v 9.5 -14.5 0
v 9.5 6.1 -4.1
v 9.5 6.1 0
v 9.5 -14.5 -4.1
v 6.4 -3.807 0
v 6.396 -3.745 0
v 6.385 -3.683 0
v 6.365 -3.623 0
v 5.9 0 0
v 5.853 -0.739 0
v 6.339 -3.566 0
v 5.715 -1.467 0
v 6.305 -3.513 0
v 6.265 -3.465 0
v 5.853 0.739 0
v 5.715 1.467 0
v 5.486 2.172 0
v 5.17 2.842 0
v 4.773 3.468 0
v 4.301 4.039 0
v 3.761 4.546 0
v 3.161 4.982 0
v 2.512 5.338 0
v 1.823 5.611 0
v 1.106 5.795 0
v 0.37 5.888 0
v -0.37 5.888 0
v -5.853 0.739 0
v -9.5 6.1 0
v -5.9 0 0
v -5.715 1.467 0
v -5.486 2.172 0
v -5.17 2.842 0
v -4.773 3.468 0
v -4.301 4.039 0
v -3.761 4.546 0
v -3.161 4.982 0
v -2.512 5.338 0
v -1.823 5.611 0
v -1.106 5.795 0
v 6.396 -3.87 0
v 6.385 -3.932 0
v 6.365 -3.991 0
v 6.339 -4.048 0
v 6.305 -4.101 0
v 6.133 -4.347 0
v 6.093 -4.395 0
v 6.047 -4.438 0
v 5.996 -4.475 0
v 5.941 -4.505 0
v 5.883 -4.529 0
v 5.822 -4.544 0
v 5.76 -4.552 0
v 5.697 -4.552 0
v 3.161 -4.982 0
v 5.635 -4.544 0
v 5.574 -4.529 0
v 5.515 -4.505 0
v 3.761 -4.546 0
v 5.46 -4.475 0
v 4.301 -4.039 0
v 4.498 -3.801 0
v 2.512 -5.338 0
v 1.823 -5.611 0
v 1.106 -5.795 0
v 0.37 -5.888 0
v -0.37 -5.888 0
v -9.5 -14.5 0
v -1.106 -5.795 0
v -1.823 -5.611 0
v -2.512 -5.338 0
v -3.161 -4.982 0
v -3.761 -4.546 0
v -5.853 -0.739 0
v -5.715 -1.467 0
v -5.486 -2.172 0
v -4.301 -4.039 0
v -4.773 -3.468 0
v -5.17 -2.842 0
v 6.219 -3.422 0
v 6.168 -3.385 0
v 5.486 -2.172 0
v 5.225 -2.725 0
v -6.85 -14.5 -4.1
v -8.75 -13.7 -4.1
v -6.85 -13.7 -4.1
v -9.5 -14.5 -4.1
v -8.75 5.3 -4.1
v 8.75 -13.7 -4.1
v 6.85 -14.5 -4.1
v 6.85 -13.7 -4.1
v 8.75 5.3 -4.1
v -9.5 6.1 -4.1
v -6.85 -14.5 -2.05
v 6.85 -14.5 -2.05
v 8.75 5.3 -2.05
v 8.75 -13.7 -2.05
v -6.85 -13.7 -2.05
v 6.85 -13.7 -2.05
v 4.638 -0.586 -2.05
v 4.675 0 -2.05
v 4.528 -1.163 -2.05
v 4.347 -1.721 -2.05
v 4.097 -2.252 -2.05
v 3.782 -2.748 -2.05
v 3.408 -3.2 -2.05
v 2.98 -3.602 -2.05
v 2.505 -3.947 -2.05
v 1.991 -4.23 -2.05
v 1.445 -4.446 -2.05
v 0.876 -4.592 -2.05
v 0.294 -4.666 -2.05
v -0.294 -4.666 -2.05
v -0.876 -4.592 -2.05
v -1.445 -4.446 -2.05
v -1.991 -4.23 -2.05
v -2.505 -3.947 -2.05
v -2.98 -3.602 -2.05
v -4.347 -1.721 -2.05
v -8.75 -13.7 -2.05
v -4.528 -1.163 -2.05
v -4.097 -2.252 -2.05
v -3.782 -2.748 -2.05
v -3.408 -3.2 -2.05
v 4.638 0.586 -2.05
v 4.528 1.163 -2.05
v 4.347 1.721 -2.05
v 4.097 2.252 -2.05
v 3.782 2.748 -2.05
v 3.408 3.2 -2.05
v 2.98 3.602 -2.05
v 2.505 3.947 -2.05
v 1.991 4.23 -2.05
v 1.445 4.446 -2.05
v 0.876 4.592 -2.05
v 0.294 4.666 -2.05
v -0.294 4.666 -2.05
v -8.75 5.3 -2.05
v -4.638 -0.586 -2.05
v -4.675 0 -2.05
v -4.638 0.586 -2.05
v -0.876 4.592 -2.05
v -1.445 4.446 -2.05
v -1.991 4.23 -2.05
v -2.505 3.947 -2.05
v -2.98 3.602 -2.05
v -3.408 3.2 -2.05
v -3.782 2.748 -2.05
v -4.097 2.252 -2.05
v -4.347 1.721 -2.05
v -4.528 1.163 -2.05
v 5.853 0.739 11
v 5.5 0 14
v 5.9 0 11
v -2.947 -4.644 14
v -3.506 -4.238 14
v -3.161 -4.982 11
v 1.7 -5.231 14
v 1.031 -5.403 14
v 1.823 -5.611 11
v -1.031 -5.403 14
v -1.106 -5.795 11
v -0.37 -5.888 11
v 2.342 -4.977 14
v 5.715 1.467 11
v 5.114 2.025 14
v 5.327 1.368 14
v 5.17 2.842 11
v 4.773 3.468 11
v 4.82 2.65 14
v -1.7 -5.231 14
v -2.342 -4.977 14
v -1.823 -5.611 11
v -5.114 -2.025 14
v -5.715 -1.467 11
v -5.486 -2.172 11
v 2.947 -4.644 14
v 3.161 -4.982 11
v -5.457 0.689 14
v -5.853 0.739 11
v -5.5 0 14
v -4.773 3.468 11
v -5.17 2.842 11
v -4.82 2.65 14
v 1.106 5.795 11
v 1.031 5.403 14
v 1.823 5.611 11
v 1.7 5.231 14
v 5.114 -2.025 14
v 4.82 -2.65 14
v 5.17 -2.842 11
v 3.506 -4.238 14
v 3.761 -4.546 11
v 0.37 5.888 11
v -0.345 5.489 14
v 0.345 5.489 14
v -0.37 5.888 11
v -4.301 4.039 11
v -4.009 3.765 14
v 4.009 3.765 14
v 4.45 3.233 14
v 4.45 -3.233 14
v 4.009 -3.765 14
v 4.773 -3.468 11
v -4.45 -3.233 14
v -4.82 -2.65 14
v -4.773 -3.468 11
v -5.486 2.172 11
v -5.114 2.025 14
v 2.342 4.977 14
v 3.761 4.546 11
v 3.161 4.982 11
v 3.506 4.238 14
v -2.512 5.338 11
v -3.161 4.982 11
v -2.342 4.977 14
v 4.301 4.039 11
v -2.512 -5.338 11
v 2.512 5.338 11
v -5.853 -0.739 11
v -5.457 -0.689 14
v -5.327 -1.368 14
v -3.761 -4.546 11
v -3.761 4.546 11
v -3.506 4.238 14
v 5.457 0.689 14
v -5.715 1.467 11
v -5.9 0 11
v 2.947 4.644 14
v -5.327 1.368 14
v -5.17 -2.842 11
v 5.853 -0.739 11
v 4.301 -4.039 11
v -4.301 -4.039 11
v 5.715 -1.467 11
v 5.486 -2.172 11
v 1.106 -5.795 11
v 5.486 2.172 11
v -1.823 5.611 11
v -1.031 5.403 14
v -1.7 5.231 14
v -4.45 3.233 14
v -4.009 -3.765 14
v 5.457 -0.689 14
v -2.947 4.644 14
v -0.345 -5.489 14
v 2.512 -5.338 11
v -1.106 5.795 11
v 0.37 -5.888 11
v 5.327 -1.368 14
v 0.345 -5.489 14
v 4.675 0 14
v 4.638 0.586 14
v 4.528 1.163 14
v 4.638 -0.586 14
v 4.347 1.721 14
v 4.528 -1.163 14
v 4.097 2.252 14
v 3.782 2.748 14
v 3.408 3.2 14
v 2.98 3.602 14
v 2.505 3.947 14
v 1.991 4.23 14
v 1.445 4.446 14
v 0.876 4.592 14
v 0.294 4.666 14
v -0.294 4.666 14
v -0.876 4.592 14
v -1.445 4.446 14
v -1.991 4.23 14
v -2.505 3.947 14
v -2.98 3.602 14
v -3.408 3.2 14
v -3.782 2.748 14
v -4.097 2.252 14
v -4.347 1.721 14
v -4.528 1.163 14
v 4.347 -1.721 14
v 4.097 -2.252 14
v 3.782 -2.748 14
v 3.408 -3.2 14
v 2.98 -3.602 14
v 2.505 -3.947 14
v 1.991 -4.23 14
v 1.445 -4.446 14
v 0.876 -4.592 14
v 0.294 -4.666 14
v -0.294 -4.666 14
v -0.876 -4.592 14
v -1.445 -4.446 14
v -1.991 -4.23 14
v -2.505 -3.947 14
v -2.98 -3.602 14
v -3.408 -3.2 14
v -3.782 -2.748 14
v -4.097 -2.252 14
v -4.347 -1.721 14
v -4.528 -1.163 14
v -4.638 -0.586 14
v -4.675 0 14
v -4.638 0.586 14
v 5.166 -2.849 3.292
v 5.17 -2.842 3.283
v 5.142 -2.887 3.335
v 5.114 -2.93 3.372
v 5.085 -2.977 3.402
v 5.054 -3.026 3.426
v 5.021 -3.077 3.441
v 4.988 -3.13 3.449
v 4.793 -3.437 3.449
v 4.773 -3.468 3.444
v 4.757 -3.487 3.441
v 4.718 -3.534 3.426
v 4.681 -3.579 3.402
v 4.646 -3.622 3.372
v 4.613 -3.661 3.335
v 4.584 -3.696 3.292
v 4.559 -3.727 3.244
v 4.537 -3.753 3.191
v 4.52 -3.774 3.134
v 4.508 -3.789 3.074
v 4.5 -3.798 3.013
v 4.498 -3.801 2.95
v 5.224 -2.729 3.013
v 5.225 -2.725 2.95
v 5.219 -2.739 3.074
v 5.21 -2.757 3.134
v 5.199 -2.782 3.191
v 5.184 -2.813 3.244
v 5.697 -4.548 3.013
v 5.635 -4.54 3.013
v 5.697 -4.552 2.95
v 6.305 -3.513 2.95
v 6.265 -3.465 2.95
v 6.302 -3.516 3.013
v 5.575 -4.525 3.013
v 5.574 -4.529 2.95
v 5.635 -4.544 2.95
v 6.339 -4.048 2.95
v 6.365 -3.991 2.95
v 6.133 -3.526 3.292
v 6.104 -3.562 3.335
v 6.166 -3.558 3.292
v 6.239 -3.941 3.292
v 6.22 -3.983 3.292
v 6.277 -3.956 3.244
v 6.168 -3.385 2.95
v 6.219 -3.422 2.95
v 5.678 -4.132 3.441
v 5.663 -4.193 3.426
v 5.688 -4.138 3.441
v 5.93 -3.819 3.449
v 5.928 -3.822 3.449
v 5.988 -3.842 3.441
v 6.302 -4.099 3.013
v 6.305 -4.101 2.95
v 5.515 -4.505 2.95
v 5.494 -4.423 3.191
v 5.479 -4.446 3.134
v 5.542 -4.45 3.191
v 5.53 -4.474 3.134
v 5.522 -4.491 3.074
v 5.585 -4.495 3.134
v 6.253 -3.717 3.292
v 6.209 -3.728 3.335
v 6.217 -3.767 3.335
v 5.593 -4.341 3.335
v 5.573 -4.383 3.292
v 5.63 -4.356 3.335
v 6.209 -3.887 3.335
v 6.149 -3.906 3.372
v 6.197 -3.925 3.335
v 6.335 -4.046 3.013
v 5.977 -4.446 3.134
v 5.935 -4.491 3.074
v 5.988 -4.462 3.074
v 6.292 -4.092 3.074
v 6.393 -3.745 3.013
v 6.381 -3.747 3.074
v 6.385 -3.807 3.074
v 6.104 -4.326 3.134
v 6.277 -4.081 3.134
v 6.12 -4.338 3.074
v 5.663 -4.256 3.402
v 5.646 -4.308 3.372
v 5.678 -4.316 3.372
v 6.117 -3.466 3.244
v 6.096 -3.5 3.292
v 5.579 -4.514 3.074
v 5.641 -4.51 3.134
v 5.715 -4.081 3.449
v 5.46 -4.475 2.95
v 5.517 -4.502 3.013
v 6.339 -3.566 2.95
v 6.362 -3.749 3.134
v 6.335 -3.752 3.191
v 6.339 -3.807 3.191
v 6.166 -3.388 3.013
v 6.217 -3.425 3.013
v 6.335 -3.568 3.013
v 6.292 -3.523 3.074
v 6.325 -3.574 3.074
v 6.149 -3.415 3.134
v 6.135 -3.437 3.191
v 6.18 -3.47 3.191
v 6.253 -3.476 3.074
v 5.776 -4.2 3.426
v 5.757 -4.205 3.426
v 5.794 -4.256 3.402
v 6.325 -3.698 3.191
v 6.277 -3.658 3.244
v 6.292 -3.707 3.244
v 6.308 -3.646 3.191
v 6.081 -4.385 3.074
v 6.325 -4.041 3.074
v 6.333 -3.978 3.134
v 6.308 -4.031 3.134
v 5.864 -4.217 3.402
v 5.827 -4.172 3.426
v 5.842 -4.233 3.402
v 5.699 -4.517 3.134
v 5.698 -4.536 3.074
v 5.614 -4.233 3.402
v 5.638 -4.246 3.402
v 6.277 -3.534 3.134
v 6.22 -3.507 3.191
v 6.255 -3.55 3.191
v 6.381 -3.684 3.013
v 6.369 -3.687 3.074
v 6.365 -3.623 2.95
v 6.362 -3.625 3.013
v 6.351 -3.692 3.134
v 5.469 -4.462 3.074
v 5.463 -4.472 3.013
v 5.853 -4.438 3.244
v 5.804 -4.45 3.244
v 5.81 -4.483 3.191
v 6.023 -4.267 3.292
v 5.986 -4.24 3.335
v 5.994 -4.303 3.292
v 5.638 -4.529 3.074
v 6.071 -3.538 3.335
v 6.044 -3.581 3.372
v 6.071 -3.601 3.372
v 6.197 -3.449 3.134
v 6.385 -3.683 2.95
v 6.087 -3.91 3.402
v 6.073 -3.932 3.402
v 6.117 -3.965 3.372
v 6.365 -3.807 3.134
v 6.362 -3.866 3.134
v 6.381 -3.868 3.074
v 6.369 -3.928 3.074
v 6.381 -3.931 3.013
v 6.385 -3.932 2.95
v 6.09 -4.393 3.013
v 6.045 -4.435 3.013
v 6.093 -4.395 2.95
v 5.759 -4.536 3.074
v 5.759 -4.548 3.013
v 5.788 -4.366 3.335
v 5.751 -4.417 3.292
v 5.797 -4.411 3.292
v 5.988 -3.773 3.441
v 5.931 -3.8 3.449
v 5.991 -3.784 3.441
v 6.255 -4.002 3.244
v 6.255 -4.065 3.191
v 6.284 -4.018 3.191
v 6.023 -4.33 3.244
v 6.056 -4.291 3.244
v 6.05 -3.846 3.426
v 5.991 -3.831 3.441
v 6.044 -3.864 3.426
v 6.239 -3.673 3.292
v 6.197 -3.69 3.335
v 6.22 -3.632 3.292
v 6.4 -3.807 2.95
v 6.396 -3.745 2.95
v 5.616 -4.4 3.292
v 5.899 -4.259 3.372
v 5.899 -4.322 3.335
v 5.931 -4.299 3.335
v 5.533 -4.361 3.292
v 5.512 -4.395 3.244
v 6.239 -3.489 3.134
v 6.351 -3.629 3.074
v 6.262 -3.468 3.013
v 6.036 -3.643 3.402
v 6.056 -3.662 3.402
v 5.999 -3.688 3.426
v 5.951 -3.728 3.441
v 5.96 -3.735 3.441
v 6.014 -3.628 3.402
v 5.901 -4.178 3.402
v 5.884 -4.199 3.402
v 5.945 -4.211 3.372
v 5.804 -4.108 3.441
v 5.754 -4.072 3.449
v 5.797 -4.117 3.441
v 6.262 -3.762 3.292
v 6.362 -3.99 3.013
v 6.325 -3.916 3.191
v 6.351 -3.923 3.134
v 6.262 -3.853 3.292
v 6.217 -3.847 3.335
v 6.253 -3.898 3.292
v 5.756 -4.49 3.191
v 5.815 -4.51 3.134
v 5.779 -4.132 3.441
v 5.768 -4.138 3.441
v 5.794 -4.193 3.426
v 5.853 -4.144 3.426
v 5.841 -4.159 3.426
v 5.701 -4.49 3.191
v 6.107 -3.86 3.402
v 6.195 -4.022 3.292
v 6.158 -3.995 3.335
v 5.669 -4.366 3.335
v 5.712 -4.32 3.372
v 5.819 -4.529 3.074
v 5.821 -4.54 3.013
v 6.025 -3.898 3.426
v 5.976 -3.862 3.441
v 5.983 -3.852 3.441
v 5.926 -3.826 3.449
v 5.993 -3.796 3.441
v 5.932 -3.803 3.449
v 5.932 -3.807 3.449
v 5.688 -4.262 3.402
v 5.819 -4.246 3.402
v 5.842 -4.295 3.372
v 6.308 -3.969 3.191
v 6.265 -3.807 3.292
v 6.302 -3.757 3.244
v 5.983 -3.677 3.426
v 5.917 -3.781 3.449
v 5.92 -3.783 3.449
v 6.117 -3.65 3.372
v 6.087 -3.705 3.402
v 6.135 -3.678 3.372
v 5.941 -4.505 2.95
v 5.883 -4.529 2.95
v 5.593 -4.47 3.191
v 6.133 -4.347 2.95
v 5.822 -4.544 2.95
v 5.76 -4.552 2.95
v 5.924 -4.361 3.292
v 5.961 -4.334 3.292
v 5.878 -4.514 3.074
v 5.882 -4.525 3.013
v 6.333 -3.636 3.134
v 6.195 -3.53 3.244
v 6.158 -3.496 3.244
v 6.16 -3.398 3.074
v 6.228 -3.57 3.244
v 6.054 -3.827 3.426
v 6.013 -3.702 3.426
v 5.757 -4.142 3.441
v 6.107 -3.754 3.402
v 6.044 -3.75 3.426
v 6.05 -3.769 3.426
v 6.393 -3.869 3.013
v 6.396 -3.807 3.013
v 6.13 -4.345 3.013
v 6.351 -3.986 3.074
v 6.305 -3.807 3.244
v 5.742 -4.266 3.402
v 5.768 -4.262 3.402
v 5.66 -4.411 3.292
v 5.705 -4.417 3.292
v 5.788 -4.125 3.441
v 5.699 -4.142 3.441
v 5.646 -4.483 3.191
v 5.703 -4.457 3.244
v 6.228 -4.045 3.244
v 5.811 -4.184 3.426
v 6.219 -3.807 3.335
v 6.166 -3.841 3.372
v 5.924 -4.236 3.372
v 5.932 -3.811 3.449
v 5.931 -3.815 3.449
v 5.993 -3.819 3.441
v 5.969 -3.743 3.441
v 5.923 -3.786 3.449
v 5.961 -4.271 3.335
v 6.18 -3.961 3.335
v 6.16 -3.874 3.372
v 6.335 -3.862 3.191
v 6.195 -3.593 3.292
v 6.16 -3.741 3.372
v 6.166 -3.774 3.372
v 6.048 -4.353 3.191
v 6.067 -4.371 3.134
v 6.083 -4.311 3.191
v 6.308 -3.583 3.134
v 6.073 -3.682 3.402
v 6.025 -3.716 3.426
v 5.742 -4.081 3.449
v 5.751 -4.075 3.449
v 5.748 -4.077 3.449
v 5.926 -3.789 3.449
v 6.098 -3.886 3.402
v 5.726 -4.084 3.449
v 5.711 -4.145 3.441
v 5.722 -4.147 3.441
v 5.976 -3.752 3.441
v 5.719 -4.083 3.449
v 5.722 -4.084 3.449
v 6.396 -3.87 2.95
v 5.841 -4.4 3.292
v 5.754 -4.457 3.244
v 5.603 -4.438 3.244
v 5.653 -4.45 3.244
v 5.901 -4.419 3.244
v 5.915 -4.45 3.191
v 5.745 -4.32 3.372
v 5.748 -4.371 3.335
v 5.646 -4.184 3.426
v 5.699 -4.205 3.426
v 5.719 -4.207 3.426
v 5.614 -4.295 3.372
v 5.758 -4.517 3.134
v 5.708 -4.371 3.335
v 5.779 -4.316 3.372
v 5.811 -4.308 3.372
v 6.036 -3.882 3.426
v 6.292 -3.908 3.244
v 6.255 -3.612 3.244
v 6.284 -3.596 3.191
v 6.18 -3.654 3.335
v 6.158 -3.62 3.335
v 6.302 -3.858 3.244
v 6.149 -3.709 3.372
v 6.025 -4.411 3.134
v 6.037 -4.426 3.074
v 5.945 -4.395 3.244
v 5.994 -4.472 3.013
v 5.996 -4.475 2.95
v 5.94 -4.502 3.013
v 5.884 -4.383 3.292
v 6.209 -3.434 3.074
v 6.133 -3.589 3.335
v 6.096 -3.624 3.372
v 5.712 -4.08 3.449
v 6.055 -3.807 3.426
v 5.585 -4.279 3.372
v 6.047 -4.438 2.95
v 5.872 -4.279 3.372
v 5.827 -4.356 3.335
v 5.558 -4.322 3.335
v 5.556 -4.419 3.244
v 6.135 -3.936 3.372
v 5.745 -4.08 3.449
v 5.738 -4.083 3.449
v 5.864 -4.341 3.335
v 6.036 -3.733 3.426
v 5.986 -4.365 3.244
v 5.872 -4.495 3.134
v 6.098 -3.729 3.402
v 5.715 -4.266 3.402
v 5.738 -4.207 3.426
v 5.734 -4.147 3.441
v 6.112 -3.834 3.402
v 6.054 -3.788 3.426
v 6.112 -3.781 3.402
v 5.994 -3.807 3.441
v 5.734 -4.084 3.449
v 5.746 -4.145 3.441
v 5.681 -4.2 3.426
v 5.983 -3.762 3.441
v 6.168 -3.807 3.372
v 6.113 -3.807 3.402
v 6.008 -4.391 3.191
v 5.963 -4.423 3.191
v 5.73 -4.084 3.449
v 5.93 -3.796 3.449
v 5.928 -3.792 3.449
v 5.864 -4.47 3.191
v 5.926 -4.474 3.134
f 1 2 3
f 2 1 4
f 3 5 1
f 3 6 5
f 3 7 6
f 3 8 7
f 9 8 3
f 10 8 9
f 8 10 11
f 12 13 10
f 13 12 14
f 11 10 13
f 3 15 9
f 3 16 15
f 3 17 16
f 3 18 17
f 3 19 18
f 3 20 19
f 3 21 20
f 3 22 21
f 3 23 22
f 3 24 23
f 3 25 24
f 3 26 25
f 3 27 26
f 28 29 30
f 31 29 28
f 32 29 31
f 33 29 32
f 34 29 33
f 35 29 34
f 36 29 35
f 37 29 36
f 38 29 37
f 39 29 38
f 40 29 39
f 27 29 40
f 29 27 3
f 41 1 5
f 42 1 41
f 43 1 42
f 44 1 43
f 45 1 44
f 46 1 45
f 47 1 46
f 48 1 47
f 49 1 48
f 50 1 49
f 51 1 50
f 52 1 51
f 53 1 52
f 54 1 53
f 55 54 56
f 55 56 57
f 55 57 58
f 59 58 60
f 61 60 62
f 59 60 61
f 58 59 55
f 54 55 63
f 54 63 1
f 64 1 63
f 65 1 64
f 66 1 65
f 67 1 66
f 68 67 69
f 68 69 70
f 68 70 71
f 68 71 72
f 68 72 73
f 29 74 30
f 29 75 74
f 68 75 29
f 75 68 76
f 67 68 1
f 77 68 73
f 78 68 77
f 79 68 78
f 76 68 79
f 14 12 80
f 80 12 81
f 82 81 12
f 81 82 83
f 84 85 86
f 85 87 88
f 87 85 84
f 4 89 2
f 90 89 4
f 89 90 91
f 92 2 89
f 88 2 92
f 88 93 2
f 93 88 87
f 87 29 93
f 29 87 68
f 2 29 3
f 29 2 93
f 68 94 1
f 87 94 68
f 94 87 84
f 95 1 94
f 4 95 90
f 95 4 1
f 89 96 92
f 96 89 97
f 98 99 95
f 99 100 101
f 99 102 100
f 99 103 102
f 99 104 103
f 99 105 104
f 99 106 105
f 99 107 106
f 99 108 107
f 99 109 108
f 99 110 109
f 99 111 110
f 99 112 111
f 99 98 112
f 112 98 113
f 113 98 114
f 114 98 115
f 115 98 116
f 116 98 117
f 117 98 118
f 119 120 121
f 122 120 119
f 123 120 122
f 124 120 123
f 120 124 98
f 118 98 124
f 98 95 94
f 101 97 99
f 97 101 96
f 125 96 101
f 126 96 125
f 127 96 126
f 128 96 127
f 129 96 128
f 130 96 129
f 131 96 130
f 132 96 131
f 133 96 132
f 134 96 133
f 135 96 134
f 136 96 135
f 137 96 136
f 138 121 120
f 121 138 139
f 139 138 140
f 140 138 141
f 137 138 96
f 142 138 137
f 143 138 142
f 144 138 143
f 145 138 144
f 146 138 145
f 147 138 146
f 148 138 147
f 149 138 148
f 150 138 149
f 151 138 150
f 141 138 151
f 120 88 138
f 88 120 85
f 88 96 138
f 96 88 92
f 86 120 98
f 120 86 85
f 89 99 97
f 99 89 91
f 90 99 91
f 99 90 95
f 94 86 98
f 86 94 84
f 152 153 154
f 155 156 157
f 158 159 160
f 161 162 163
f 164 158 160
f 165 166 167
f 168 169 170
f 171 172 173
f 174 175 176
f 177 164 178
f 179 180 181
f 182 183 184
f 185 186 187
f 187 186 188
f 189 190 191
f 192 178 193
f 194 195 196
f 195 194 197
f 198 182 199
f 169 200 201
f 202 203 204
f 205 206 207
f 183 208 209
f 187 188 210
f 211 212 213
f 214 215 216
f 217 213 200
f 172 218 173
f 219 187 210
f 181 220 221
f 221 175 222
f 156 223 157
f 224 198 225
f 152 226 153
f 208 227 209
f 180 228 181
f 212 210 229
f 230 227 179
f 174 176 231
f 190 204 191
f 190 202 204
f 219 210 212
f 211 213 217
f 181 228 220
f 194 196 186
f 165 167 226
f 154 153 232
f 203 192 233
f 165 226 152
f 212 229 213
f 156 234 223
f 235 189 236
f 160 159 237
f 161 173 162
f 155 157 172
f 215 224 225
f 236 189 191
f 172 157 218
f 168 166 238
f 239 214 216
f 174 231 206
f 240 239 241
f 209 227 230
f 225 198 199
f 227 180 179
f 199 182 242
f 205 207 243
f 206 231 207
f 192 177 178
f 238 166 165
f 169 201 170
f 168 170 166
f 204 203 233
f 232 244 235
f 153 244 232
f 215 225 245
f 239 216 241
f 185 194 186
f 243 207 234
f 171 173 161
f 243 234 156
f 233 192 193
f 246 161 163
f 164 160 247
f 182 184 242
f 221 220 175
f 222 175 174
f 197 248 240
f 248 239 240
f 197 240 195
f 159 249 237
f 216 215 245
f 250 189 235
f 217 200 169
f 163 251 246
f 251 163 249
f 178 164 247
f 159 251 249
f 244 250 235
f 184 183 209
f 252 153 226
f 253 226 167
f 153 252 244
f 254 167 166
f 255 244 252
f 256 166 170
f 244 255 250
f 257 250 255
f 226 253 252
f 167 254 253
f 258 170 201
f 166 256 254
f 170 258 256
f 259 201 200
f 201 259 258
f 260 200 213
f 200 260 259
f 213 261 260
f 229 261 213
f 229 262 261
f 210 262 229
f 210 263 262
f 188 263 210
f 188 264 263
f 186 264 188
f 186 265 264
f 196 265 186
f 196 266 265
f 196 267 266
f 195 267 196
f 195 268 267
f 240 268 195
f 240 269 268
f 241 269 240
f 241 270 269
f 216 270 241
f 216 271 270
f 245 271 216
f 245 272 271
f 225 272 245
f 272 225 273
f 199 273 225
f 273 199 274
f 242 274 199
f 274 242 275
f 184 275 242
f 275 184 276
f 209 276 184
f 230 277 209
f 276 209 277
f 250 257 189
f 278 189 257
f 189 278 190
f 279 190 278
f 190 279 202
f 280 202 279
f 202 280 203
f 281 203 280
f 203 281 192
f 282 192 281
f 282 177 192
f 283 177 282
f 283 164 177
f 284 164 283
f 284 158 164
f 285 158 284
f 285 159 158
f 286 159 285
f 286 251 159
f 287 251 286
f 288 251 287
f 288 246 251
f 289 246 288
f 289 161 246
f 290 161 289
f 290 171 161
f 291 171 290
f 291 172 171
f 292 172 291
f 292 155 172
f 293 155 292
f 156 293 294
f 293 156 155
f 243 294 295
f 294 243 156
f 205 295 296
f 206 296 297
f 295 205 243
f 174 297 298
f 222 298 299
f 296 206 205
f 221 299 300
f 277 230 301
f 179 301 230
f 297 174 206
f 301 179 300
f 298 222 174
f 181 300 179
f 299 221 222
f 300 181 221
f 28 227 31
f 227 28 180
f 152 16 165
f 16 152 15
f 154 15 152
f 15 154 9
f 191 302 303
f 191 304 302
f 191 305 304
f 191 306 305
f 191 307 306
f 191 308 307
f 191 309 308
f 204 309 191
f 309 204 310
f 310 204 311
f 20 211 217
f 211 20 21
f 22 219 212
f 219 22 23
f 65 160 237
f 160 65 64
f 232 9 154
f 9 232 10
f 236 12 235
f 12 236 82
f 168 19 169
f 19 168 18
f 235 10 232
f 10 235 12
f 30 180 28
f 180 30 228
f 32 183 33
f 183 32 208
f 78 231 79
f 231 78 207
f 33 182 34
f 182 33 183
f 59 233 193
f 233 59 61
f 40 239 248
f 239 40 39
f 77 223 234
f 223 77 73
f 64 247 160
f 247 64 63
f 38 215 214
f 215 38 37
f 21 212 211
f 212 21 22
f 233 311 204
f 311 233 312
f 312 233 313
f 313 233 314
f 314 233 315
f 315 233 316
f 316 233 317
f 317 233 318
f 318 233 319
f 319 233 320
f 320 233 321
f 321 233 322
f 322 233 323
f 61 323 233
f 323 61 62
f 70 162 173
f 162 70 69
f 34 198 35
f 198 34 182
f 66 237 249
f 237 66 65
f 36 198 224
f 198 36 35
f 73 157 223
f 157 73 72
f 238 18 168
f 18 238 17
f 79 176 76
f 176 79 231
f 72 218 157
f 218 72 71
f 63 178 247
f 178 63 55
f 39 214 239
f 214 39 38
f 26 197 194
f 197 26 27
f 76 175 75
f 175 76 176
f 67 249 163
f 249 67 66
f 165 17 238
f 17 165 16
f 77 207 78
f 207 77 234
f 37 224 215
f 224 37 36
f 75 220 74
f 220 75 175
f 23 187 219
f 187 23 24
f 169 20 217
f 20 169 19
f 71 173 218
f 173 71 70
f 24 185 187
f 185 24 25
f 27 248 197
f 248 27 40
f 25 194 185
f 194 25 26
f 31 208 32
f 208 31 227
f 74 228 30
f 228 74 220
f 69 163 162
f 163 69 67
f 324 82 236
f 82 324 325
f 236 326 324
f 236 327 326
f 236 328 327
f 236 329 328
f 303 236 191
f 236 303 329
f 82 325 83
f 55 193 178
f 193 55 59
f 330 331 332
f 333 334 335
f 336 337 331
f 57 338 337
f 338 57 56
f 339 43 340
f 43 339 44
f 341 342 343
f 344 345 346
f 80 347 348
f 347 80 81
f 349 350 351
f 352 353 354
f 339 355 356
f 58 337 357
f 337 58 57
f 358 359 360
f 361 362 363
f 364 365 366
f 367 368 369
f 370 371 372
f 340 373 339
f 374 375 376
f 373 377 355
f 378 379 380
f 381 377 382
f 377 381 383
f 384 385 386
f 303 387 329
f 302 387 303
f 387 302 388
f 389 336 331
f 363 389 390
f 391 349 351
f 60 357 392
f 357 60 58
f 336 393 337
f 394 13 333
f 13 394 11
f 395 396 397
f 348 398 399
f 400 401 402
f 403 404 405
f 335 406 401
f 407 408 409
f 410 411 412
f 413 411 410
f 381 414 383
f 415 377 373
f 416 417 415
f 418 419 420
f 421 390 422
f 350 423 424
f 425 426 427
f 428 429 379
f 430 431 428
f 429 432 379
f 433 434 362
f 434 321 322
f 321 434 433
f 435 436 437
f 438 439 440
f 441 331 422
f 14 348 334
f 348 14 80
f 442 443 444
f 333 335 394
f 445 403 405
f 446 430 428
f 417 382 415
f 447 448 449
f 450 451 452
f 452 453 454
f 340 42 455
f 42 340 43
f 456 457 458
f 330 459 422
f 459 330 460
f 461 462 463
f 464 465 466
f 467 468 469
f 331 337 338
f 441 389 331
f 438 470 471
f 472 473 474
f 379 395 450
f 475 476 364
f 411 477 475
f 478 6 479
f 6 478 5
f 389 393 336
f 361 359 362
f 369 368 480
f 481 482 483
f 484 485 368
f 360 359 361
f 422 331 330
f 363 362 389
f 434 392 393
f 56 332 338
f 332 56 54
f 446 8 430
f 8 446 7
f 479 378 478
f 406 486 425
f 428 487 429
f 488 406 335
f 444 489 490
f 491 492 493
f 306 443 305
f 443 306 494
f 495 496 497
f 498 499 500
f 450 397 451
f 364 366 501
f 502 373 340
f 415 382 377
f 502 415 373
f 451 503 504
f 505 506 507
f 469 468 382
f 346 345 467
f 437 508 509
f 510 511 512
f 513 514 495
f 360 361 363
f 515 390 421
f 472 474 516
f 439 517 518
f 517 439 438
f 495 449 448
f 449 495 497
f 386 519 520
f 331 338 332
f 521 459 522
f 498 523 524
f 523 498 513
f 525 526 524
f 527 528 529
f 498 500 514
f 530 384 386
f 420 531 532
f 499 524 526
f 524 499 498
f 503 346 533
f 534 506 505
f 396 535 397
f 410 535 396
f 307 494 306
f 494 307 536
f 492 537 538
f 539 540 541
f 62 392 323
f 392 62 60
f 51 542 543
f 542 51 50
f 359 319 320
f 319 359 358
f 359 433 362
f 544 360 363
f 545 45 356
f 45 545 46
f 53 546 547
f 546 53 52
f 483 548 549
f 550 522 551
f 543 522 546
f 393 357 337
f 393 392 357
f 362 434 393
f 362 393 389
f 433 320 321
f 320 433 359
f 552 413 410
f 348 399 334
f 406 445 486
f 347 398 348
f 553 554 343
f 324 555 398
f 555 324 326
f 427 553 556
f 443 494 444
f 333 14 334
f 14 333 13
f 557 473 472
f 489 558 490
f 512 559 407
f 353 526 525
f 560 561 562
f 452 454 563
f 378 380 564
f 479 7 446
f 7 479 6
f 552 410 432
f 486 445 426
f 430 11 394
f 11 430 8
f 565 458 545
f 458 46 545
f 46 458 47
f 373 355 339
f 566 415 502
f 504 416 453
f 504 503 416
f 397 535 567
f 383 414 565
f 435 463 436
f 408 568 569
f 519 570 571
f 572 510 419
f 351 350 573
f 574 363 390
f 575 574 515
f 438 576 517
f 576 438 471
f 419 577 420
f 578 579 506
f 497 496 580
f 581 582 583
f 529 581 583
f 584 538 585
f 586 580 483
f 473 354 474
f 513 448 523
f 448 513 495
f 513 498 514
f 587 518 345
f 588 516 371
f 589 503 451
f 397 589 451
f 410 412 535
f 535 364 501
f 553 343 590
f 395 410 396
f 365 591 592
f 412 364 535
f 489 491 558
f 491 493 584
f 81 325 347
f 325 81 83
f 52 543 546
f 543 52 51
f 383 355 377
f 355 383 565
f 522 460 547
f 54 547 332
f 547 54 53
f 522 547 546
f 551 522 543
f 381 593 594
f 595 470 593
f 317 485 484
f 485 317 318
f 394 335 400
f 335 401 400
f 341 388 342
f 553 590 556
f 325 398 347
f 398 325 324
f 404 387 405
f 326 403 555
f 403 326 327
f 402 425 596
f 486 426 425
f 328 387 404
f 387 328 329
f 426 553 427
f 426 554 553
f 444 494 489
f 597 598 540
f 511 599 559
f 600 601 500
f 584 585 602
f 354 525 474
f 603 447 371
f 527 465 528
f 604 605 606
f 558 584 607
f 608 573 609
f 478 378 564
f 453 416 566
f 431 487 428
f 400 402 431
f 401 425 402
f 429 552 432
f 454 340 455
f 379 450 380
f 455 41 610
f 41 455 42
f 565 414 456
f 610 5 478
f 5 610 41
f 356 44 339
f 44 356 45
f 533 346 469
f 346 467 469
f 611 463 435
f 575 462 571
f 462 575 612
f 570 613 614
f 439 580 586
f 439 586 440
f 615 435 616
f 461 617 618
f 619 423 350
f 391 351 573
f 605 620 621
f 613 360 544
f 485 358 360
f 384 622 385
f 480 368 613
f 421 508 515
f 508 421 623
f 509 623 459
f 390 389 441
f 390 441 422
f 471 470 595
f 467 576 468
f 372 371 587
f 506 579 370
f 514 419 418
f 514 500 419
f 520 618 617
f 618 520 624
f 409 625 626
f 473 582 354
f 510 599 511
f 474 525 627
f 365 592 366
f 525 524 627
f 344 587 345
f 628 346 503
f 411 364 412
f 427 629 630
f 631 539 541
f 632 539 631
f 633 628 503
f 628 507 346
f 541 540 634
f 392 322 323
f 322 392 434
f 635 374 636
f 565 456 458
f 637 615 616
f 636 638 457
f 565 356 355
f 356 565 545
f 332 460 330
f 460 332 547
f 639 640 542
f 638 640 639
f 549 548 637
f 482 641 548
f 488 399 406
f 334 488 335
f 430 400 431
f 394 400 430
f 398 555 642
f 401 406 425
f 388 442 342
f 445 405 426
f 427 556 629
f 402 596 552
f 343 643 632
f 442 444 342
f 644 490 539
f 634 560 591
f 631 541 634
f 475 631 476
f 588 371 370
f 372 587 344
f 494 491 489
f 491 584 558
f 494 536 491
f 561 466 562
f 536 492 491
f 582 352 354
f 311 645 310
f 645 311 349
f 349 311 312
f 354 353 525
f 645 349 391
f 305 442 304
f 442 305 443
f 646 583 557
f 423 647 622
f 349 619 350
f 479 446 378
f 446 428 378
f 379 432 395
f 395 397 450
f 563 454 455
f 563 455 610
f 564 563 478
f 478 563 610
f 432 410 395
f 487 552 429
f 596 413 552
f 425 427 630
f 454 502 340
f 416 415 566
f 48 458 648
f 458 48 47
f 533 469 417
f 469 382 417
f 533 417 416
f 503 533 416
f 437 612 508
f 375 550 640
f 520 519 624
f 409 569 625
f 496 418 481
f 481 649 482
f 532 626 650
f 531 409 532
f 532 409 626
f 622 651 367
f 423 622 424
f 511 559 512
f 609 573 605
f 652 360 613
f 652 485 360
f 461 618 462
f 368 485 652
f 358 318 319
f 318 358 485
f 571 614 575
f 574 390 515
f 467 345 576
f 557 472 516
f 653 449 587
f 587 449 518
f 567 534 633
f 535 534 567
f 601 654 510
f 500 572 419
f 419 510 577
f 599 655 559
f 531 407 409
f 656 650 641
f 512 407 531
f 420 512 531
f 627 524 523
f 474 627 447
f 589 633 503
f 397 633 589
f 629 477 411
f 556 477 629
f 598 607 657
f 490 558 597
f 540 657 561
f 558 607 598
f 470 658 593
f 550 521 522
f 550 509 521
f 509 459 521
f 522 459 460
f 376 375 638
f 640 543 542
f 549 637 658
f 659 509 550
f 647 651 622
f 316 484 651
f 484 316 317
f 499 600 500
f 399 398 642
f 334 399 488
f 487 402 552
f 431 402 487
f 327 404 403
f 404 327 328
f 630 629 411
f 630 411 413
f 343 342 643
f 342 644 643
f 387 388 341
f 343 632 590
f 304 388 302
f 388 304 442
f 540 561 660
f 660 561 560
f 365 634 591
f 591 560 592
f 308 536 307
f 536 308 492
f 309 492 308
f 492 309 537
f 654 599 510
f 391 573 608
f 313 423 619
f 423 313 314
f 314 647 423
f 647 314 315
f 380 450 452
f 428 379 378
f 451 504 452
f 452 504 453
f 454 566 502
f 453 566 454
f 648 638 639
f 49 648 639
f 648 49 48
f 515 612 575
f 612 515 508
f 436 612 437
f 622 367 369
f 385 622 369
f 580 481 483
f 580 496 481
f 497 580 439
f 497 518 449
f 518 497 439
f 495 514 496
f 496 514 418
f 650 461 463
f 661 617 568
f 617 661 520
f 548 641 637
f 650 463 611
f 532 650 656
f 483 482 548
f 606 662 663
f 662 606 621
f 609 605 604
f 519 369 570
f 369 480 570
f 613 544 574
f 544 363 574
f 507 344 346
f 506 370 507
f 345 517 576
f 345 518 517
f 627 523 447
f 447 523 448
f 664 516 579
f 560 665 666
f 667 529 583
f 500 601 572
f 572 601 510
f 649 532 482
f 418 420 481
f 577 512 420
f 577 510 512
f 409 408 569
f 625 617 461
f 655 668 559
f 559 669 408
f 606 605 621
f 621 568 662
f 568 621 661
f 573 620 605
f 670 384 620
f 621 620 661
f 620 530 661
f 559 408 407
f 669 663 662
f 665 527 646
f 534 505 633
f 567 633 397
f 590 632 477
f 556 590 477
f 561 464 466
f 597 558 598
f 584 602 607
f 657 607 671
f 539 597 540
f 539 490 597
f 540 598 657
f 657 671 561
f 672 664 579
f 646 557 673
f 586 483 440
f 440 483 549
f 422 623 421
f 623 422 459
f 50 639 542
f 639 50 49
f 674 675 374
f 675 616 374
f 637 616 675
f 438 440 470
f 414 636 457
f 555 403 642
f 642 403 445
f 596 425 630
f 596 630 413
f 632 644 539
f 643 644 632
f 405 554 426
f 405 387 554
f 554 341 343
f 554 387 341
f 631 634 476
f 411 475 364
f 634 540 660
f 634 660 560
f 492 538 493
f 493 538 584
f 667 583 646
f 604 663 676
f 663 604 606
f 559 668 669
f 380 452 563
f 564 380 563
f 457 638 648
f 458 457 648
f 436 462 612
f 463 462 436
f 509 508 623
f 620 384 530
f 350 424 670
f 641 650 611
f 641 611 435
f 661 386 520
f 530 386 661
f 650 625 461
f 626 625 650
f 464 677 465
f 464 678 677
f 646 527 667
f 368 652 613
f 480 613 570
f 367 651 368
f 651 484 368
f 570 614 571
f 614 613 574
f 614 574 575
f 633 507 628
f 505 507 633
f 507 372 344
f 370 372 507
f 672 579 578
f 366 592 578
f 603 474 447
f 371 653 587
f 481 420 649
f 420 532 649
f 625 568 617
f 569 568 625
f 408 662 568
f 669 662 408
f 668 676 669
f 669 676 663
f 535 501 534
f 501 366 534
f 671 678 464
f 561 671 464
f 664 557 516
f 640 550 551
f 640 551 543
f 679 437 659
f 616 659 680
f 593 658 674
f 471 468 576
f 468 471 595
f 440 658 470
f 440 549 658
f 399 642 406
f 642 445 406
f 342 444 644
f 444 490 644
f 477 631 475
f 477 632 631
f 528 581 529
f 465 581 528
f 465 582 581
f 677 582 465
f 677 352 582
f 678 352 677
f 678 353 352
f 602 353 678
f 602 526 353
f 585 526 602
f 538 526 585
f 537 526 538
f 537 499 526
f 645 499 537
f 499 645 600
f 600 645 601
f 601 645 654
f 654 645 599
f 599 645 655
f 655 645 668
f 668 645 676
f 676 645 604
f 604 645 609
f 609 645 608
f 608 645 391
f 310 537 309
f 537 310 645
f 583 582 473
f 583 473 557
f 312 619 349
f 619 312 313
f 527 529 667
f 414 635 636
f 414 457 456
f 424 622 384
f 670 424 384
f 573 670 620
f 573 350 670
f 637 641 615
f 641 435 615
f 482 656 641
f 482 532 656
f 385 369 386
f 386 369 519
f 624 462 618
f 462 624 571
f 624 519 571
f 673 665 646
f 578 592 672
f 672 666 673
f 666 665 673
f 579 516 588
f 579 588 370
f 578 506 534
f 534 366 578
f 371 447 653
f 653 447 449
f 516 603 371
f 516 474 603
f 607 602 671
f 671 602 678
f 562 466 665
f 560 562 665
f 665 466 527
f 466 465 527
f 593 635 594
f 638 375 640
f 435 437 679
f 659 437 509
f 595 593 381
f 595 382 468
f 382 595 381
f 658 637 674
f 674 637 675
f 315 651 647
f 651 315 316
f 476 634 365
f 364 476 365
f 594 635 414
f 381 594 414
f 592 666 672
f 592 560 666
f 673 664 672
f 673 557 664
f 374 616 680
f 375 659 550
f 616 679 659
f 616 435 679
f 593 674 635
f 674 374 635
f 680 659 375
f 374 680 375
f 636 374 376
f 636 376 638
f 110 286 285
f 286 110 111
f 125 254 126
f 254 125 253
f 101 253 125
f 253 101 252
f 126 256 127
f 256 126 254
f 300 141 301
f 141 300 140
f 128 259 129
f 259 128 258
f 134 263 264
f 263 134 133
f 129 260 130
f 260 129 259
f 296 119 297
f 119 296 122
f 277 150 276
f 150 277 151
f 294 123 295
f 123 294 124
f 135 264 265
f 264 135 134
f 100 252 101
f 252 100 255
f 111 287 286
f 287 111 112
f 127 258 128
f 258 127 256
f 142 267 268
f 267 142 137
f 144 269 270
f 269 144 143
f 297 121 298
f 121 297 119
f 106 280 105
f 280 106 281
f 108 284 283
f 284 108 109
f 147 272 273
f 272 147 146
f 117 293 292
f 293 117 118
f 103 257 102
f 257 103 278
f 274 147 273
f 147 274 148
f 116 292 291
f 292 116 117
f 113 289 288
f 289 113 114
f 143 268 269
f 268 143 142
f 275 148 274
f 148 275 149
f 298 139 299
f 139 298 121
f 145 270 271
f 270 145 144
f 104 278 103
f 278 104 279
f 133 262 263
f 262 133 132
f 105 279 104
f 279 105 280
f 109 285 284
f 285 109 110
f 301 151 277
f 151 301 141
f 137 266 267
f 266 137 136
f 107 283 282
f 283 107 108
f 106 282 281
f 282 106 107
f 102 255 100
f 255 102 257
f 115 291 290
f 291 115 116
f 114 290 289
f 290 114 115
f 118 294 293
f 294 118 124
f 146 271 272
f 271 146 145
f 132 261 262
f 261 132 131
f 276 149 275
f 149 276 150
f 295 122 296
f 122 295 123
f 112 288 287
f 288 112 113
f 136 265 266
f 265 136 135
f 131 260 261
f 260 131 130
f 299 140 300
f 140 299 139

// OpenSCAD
// IBM Model F Key Barrel
$fn=50;
module key_barrel() {
    difference() {
        // Outer cylinder with base
        union() {
            translate([0, 0, 14-3]) // Slightly lower to merge with the cylinder
            cylinder(h=3, d1=11.8, d2=11);
            cylinder(h=14-3, d=11.8);
            difference() {
                translate([0, -4.2, -4.1/2]) // Slightly lower to merge with the cylinder
                cube([19, 20.6, 4.1], center=true);

                translate([0, -4.2, -4.1/2 - 3.38/2]) // Slightly lower to merge with the cylinder
                cube([17.5, 19, 3.38], center=true);

                translate([0, -20, -4.1/2 - 3.38/2]) // Slightly lower to merge with the cylinder
                cube([13.7, 13.7, 3.38], center=true);
            }

            // notch at 300° of the cylinder
            t=0.5;
            minkowski() {
                translate([5.2, -3.5, 1.2])
                rotate([0, 0, 55])
                cube([0.8-t,2-t,4-t], center=true);
                sphere(r=t);
            }
        }
        // Inner shaft
        translate([0, 0, -4.9])
        cylinder(h=20.9, d=9.35, $fn=50); // +2 to ensure it cuts through completely
    }
}

// Render the key barrel
key_barrel();

// Note: This code assumes that the bottom of the barrel is flat and that the base is centered under the barrel.
// The $fn=50 parameter in the inner cylinder provides a smooth finish.
